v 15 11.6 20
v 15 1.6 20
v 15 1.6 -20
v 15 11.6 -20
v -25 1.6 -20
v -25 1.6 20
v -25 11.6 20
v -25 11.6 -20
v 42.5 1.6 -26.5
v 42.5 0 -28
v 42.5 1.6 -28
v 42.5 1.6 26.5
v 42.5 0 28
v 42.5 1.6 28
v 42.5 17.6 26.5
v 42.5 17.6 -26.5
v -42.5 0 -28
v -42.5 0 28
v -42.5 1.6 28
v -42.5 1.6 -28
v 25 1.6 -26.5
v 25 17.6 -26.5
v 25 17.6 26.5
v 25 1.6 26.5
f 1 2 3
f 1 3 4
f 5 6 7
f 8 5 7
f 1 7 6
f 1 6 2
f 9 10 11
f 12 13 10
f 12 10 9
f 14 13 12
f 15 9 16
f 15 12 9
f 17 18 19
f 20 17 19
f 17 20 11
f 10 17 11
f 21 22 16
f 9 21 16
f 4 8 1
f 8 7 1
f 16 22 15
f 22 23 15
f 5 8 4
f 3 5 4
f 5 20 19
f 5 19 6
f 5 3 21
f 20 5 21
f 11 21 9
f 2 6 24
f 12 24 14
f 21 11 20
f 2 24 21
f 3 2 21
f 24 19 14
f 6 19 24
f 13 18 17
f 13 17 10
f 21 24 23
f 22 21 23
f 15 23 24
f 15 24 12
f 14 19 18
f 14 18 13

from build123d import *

# Parameters (mm, degrees)
SK_BOARD_W   = 85
SK_BOARD_H   = 1.6
BOARD_DEPTH  = 28
SK_COOLER_W  = 40
SK_COOLER_H  = 10
COOLER_DEPTH = 20
SK_PORTS_W   = 17.5
SK_PORTS_H   = 16
PORTS_DEPTH  = 26.5


with BuildPart() as part:
    # SK_Board → Board (new, symmetric)
    with BuildSketch(Plane.XY):
        with Locations((0, 0.8)):
            Rectangle(SK_BOARD_W, SK_BOARD_H)
    extrude(amount=BOARD_DEPTH, both=True)

    # SK_Cooler → Cooler (add, symmetric)
    with BuildSketch(Plane.XY):
        with Locations((-5, 6.6)):
            Rectangle(SK_COOLER_W, SK_COOLER_H)
    extrude(amount=COOLER_DEPTH, both=True)

    # SK_Ports → Ports (add, symmetric)
    with BuildSketch(Plane.XY):
        with Locations((33.75, 9.6)):
            Rectangle(SK_PORTS_W, SK_PORTS_H)
    extrude(amount=PORTS_DEPTH, both=True)


solid = part.part
